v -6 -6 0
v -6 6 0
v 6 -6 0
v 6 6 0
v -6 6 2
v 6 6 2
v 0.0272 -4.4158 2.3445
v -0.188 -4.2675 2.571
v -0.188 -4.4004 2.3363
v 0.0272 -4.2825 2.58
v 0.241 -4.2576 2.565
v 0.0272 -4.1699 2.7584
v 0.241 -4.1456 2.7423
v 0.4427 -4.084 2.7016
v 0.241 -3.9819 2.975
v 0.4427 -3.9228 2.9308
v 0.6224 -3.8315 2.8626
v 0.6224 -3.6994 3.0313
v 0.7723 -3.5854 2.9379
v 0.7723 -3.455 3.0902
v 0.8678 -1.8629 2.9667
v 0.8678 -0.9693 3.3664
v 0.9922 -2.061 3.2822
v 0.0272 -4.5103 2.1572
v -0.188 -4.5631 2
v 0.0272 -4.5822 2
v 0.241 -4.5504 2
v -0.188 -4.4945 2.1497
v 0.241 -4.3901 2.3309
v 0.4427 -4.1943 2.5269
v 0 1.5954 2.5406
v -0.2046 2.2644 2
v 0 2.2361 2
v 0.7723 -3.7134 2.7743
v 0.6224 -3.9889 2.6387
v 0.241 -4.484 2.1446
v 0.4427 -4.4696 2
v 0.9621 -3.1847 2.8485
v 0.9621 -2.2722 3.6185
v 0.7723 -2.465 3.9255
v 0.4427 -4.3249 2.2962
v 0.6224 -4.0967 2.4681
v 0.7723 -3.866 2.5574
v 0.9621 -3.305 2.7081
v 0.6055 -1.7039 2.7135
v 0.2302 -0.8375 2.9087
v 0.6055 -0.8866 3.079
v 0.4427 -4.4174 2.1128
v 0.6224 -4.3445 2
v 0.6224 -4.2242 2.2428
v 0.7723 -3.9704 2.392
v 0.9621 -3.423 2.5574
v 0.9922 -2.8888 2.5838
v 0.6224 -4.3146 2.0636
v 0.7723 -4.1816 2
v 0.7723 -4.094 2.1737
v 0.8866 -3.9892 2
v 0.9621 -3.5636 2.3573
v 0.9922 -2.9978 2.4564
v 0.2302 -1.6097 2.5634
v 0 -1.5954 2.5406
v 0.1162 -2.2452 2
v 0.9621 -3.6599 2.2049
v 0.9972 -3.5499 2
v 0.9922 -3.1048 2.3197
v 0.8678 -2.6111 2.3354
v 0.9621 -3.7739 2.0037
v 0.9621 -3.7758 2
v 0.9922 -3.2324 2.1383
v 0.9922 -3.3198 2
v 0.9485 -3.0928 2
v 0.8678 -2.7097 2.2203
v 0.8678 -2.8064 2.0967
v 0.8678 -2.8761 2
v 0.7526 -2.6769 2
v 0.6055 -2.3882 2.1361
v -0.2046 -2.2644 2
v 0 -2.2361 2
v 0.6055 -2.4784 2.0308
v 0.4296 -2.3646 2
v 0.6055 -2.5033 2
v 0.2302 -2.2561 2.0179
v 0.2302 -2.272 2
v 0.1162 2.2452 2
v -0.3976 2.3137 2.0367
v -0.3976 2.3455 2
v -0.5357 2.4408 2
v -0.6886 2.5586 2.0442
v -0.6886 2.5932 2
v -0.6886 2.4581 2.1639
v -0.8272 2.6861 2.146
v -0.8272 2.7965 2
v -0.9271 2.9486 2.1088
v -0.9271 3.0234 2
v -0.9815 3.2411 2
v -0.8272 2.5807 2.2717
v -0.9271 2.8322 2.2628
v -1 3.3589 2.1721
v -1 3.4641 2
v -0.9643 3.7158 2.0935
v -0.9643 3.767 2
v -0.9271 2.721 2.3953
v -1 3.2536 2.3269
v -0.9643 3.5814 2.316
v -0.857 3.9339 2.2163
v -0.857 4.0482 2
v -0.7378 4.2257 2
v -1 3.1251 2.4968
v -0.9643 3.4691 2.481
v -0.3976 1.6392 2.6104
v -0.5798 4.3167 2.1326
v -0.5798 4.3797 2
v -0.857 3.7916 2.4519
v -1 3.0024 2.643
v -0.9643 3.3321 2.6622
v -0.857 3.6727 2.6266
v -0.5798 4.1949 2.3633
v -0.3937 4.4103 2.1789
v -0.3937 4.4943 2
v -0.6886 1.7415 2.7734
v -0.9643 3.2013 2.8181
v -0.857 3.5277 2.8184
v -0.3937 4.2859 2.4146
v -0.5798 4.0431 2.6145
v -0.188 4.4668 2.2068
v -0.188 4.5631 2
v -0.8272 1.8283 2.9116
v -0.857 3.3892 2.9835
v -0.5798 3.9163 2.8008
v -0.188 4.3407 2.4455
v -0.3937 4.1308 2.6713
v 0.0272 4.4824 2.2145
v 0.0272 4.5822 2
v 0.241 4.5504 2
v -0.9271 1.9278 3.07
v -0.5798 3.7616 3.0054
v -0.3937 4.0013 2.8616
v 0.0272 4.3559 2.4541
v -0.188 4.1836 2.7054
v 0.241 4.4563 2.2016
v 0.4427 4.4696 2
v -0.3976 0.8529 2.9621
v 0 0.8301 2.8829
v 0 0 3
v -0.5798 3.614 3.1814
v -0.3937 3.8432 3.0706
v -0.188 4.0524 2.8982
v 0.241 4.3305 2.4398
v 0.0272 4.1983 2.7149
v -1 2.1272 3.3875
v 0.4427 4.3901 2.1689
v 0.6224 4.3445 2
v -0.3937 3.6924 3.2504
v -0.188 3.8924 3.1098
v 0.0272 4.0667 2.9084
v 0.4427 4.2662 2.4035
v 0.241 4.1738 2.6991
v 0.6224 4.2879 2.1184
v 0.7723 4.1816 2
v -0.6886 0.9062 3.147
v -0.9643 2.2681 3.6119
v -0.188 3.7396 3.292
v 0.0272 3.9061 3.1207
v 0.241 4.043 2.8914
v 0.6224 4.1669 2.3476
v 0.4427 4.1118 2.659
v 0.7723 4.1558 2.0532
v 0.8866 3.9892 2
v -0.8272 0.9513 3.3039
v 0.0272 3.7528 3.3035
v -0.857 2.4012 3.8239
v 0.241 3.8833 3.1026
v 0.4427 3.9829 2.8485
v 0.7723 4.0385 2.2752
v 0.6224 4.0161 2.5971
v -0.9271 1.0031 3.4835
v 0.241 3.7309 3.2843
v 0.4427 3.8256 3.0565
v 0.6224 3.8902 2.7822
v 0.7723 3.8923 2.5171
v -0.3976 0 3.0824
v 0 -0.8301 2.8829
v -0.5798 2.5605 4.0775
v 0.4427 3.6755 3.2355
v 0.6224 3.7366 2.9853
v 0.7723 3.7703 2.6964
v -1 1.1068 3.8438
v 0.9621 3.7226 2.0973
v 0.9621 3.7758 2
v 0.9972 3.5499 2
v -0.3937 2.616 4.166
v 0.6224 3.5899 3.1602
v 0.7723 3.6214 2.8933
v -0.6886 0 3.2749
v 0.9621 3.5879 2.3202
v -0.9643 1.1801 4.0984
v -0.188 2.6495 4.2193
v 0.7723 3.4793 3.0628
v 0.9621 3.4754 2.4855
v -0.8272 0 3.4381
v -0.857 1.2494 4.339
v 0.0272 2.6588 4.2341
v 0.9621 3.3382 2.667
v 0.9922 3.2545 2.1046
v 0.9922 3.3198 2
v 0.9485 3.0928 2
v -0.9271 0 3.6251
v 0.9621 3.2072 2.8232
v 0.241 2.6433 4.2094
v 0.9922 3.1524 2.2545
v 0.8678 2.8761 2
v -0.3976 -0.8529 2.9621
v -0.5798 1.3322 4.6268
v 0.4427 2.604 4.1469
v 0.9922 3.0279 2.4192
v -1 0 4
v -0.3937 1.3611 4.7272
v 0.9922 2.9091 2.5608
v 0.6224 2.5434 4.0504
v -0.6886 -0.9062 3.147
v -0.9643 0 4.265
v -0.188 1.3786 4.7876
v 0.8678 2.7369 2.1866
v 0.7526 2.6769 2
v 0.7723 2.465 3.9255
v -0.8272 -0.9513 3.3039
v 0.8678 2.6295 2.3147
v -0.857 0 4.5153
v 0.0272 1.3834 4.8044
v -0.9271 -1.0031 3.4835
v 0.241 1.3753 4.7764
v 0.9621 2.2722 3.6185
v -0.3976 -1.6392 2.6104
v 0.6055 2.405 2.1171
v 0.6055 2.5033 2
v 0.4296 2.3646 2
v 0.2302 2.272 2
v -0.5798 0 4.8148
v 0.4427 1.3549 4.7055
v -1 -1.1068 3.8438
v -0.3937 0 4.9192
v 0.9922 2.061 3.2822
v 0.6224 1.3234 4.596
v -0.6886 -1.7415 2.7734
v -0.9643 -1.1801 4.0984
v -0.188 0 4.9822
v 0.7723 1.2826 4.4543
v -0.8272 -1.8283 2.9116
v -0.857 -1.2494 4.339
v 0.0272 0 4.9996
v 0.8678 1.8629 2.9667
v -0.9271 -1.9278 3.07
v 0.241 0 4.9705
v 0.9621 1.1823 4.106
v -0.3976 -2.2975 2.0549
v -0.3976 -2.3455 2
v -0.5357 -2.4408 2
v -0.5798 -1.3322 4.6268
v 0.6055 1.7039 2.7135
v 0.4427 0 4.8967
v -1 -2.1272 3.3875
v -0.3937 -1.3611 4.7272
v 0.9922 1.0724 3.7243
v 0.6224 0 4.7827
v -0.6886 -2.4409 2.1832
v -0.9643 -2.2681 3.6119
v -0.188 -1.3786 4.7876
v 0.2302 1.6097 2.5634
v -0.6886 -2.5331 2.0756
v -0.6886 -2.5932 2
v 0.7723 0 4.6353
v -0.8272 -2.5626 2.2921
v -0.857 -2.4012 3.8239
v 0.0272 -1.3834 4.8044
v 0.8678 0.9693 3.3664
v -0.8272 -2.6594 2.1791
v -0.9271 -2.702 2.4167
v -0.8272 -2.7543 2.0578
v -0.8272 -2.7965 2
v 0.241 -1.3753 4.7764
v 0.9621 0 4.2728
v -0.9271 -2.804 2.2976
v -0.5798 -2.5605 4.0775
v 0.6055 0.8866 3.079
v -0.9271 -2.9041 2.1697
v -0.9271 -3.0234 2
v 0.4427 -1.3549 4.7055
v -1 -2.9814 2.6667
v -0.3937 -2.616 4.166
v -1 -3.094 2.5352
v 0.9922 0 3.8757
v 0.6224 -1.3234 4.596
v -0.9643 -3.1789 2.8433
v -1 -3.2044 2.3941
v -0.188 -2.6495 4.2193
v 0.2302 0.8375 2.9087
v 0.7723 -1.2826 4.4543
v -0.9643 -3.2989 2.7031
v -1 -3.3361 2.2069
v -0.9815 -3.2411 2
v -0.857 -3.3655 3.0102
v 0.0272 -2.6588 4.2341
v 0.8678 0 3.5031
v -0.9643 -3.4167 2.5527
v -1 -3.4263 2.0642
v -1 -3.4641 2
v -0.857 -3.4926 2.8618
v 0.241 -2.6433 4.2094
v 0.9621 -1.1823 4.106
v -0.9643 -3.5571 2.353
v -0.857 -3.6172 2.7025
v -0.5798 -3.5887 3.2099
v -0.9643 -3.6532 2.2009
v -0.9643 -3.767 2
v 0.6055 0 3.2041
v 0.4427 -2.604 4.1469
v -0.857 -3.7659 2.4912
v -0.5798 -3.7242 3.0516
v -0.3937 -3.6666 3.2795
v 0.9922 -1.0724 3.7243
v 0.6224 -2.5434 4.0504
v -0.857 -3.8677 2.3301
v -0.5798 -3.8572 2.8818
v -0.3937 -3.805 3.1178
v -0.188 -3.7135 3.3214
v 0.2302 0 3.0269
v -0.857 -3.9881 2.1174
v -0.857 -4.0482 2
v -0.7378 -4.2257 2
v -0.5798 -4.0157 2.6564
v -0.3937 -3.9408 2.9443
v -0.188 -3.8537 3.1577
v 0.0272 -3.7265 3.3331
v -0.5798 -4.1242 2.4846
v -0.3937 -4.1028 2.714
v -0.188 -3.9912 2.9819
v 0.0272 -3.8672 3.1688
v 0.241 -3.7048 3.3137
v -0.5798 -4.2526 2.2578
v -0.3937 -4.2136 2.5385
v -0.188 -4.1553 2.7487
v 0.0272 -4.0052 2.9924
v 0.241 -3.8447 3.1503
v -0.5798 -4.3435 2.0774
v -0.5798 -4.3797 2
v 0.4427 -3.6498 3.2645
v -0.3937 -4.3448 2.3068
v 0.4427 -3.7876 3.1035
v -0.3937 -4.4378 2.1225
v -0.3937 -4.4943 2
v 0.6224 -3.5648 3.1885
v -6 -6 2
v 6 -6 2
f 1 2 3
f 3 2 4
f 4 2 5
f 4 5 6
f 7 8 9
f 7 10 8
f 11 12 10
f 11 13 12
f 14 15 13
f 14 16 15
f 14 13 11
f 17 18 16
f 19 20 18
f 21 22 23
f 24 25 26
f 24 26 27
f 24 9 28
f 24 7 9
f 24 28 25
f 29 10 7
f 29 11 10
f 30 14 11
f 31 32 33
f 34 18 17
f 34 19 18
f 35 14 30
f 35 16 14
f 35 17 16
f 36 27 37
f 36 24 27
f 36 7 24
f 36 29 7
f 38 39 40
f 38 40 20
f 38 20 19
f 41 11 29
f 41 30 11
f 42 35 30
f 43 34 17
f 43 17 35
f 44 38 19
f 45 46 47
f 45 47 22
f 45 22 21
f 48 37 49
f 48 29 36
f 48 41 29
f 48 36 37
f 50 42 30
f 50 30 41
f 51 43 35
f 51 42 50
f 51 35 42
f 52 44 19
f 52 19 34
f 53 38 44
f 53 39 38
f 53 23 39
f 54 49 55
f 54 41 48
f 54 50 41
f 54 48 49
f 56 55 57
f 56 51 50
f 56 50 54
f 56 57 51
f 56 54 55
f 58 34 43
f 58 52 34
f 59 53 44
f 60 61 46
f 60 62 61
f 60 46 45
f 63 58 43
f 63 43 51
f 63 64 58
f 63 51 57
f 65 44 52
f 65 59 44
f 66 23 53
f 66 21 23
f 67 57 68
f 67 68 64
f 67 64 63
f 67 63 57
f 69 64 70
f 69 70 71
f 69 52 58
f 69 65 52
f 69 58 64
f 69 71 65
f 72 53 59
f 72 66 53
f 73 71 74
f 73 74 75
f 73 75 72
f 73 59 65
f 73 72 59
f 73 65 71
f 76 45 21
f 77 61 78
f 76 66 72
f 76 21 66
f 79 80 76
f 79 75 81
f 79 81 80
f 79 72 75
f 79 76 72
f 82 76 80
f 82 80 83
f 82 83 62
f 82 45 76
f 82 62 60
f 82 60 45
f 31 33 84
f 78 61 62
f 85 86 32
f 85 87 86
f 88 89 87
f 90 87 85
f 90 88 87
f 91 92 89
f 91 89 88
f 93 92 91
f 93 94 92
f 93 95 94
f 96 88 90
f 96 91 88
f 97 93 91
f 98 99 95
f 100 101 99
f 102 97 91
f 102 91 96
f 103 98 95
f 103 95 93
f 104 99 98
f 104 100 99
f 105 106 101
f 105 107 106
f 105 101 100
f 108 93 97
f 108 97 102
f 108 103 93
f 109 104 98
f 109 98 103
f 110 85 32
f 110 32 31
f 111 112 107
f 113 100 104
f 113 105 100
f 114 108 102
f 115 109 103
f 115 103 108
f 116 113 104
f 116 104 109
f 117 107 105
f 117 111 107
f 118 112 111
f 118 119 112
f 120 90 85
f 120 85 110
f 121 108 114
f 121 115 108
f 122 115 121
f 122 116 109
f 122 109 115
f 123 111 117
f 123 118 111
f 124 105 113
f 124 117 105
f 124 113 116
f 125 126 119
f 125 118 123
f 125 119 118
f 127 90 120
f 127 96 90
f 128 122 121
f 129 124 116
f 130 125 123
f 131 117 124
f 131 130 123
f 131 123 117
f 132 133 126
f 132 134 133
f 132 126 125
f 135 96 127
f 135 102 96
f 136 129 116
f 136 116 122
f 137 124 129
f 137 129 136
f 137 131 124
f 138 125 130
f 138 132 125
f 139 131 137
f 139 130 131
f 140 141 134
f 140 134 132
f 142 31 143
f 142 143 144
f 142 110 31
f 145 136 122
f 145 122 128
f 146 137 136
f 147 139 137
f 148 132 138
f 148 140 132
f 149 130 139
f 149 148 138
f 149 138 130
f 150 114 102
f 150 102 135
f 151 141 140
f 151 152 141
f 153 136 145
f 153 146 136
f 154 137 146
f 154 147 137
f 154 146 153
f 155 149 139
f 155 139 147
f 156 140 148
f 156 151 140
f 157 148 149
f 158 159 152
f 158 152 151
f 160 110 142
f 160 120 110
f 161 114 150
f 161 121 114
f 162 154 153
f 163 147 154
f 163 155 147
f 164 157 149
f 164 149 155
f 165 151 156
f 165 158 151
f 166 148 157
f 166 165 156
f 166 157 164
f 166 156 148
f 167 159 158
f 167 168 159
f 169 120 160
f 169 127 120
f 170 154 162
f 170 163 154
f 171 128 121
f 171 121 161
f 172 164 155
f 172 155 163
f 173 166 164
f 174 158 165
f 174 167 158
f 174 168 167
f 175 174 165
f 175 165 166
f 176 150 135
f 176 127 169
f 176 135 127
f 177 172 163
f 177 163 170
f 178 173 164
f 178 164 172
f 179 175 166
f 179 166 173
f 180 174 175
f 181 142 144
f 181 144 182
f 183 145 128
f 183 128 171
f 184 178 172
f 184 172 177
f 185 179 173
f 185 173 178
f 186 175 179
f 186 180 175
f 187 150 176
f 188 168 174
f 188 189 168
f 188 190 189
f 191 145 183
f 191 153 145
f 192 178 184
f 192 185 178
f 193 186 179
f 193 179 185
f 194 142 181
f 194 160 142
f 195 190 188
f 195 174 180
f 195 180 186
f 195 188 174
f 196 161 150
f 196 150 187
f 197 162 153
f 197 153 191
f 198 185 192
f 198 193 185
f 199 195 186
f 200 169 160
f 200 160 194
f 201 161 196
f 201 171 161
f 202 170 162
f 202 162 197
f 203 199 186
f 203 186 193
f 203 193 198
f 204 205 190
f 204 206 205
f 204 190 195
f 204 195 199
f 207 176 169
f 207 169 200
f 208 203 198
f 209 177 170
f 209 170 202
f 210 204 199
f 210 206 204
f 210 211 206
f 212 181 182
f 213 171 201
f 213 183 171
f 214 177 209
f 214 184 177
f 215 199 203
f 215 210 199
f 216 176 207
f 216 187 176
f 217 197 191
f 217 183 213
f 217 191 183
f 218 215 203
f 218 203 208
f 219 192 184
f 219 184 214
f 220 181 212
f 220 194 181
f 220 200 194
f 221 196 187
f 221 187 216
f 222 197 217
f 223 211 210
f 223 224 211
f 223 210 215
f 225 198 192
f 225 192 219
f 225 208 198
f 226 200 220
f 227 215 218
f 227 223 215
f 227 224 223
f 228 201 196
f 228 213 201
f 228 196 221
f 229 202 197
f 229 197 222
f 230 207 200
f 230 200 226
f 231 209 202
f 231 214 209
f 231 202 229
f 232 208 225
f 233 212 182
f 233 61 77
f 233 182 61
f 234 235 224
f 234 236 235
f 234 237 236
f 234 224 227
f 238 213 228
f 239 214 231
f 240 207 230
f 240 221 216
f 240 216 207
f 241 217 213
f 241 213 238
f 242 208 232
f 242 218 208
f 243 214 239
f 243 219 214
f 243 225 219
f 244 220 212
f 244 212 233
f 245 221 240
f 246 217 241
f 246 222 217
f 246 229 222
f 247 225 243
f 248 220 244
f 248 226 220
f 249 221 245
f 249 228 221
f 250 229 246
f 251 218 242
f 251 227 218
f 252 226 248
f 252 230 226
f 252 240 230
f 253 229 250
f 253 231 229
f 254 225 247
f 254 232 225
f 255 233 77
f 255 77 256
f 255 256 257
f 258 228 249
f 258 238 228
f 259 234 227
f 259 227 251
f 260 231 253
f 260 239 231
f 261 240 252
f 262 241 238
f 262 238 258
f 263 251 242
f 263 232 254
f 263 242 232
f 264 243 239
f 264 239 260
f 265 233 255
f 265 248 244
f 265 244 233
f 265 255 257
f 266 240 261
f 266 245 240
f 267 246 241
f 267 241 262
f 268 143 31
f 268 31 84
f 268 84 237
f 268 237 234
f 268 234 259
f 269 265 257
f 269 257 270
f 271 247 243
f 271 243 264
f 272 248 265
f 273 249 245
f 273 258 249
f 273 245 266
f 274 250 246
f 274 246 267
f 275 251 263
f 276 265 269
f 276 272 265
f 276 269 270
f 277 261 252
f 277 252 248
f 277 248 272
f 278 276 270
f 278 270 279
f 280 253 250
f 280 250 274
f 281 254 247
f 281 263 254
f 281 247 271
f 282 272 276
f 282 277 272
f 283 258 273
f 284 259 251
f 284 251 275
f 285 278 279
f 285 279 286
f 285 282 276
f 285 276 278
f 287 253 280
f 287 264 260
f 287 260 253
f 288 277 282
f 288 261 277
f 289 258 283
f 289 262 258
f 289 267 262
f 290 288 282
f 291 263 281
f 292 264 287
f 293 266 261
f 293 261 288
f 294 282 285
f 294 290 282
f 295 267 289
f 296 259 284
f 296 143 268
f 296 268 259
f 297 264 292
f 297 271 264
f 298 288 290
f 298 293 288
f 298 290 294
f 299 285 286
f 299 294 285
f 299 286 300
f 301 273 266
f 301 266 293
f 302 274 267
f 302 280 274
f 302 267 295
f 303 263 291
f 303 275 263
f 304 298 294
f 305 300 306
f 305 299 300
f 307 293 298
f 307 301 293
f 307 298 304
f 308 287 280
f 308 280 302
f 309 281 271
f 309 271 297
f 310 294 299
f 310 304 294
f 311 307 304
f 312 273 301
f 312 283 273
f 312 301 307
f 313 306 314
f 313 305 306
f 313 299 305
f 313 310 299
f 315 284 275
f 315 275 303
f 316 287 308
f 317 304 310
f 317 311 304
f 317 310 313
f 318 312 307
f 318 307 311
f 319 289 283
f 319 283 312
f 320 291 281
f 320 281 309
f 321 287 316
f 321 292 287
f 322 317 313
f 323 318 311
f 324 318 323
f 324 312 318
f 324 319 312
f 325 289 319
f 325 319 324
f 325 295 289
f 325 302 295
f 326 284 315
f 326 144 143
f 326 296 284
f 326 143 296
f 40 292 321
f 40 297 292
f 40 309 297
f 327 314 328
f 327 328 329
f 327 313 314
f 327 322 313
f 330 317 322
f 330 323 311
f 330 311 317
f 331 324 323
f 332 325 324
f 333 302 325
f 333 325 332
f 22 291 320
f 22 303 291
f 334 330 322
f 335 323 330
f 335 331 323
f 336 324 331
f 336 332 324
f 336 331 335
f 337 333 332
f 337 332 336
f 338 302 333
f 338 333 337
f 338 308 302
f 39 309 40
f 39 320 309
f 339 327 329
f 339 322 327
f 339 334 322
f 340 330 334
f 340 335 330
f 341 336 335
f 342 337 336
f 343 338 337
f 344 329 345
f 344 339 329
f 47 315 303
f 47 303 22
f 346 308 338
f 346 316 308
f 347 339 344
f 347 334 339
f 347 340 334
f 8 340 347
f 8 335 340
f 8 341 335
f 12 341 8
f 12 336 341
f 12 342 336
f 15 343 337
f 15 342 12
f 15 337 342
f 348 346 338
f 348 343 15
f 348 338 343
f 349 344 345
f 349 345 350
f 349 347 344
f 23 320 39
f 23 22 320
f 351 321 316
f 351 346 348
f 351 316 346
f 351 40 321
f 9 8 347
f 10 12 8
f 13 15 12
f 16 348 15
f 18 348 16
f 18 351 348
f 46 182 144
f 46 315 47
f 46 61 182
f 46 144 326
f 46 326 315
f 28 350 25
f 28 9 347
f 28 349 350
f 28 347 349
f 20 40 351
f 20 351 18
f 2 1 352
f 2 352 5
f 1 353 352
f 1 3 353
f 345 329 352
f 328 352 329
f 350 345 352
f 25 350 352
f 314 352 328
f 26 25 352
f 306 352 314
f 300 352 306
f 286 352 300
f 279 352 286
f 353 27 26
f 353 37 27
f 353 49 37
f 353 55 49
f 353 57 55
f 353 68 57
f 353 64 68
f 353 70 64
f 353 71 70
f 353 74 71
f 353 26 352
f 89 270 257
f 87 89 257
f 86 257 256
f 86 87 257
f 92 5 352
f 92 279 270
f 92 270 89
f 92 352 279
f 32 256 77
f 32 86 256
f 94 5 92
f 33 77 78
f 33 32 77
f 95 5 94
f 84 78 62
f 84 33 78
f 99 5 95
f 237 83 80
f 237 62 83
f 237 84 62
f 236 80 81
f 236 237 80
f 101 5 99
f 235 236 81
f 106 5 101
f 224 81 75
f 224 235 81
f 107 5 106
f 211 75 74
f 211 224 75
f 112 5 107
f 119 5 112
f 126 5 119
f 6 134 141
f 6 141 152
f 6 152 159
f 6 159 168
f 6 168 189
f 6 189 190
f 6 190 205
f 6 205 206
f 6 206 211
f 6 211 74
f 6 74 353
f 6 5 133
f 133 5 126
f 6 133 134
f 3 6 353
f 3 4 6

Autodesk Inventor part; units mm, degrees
ref_plane "YZ Plane" through (0, 0, 0) normal (1, 0, 0) x (0, 1, 0)
ref_plane "XZ Plane" through (0, 0, 0) normal (0, 1, 0) x (-1, 0, 0)
ref_plane "XY Plane" through (0, 0, 0) normal (0, 0, 1) x (1, 0, 0)
sketch "Sketch1" plane through (0, 0, 0) normal (0, 0, 1) x (1, 0, 0)
  line L0 (-6, 6) -> (6, 6)
  line L1 (6, 6) -> (6, -6)
  line L2 (6, -6) -> (-6, -6)
  line L3 (-6, -6) -> (-6, 6)
  line L4 (-6, 6) -> (6, -6) construction
  line L5 (6, 6) -> (-6, -6) construction
  point P0 (0, 0)
  dimension "d0" = 12
  dimension "d1" = 12
extrude "Extrusion1" add sketch "Sketch1" along normal blind 2
sketch "Sketch2" plane through (0, 0, 0) normal (1, 0, 0) x (0, 1, 0)
  arc A0 (4, 0) -> (-4, 0) centre (0, 0) ccw
  line L0 (-6, 0) -> (6, 0) projected
  dimension "d4" = 8
sketch "Sketch3" plane through (0, 0, 0) normal (0, 0, -1) x (-1, 0, 0)
  circle A0 centre (0, -4) radius 1
  line L0 (0, 4) -> (0, -4) projected
  point P0 (0, 0)
  dimension "d5" = 2
sweep "Sweep1" add profiles "Sketch3" path "Sketch2" path curves A0
properties part number "pad"
